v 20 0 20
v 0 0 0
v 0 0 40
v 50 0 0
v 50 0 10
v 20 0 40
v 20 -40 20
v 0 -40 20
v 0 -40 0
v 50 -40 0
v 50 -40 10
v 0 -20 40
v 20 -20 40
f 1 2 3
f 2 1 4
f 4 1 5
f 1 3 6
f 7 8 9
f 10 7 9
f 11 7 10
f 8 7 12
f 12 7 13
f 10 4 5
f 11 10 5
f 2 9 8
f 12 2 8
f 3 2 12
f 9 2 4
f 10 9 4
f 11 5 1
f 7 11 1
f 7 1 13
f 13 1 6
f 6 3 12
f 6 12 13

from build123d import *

# Parameters (mm, degrees)
F1_DEPTH = 40
F0_W     = 20
F0_H     = 20
F2_DEPTH = 40
F4_DEPTH = 20


with BuildPart() as f1:
    # F0 (on Front) → F1 (new body)
    with BuildSketch(Plane.XZ):
        Polygon((0, 20), (0, 0), (50, 0), (50, 10), (20, 20), align=None)
    extrude(amount=F1_DEPTH)

    # F0 (on Front) → F2 (join)
    with BuildSketch(Plane.XZ):
        with Locations((10, 30)):
            Rectangle(F0_W, F0_H)
    extrude(amount=F2_DEPTH)

    # F3 (on face) → F4 (cut)
    with BuildSketch(Plane.YZ.offset(20)):
        Polygon((-40, 20), (-20, 40), (-40, 40), align=None)
    extrude(amount=-F4_DEPTH, mode=Mode.SUBTRACT)


solid = f1.part
